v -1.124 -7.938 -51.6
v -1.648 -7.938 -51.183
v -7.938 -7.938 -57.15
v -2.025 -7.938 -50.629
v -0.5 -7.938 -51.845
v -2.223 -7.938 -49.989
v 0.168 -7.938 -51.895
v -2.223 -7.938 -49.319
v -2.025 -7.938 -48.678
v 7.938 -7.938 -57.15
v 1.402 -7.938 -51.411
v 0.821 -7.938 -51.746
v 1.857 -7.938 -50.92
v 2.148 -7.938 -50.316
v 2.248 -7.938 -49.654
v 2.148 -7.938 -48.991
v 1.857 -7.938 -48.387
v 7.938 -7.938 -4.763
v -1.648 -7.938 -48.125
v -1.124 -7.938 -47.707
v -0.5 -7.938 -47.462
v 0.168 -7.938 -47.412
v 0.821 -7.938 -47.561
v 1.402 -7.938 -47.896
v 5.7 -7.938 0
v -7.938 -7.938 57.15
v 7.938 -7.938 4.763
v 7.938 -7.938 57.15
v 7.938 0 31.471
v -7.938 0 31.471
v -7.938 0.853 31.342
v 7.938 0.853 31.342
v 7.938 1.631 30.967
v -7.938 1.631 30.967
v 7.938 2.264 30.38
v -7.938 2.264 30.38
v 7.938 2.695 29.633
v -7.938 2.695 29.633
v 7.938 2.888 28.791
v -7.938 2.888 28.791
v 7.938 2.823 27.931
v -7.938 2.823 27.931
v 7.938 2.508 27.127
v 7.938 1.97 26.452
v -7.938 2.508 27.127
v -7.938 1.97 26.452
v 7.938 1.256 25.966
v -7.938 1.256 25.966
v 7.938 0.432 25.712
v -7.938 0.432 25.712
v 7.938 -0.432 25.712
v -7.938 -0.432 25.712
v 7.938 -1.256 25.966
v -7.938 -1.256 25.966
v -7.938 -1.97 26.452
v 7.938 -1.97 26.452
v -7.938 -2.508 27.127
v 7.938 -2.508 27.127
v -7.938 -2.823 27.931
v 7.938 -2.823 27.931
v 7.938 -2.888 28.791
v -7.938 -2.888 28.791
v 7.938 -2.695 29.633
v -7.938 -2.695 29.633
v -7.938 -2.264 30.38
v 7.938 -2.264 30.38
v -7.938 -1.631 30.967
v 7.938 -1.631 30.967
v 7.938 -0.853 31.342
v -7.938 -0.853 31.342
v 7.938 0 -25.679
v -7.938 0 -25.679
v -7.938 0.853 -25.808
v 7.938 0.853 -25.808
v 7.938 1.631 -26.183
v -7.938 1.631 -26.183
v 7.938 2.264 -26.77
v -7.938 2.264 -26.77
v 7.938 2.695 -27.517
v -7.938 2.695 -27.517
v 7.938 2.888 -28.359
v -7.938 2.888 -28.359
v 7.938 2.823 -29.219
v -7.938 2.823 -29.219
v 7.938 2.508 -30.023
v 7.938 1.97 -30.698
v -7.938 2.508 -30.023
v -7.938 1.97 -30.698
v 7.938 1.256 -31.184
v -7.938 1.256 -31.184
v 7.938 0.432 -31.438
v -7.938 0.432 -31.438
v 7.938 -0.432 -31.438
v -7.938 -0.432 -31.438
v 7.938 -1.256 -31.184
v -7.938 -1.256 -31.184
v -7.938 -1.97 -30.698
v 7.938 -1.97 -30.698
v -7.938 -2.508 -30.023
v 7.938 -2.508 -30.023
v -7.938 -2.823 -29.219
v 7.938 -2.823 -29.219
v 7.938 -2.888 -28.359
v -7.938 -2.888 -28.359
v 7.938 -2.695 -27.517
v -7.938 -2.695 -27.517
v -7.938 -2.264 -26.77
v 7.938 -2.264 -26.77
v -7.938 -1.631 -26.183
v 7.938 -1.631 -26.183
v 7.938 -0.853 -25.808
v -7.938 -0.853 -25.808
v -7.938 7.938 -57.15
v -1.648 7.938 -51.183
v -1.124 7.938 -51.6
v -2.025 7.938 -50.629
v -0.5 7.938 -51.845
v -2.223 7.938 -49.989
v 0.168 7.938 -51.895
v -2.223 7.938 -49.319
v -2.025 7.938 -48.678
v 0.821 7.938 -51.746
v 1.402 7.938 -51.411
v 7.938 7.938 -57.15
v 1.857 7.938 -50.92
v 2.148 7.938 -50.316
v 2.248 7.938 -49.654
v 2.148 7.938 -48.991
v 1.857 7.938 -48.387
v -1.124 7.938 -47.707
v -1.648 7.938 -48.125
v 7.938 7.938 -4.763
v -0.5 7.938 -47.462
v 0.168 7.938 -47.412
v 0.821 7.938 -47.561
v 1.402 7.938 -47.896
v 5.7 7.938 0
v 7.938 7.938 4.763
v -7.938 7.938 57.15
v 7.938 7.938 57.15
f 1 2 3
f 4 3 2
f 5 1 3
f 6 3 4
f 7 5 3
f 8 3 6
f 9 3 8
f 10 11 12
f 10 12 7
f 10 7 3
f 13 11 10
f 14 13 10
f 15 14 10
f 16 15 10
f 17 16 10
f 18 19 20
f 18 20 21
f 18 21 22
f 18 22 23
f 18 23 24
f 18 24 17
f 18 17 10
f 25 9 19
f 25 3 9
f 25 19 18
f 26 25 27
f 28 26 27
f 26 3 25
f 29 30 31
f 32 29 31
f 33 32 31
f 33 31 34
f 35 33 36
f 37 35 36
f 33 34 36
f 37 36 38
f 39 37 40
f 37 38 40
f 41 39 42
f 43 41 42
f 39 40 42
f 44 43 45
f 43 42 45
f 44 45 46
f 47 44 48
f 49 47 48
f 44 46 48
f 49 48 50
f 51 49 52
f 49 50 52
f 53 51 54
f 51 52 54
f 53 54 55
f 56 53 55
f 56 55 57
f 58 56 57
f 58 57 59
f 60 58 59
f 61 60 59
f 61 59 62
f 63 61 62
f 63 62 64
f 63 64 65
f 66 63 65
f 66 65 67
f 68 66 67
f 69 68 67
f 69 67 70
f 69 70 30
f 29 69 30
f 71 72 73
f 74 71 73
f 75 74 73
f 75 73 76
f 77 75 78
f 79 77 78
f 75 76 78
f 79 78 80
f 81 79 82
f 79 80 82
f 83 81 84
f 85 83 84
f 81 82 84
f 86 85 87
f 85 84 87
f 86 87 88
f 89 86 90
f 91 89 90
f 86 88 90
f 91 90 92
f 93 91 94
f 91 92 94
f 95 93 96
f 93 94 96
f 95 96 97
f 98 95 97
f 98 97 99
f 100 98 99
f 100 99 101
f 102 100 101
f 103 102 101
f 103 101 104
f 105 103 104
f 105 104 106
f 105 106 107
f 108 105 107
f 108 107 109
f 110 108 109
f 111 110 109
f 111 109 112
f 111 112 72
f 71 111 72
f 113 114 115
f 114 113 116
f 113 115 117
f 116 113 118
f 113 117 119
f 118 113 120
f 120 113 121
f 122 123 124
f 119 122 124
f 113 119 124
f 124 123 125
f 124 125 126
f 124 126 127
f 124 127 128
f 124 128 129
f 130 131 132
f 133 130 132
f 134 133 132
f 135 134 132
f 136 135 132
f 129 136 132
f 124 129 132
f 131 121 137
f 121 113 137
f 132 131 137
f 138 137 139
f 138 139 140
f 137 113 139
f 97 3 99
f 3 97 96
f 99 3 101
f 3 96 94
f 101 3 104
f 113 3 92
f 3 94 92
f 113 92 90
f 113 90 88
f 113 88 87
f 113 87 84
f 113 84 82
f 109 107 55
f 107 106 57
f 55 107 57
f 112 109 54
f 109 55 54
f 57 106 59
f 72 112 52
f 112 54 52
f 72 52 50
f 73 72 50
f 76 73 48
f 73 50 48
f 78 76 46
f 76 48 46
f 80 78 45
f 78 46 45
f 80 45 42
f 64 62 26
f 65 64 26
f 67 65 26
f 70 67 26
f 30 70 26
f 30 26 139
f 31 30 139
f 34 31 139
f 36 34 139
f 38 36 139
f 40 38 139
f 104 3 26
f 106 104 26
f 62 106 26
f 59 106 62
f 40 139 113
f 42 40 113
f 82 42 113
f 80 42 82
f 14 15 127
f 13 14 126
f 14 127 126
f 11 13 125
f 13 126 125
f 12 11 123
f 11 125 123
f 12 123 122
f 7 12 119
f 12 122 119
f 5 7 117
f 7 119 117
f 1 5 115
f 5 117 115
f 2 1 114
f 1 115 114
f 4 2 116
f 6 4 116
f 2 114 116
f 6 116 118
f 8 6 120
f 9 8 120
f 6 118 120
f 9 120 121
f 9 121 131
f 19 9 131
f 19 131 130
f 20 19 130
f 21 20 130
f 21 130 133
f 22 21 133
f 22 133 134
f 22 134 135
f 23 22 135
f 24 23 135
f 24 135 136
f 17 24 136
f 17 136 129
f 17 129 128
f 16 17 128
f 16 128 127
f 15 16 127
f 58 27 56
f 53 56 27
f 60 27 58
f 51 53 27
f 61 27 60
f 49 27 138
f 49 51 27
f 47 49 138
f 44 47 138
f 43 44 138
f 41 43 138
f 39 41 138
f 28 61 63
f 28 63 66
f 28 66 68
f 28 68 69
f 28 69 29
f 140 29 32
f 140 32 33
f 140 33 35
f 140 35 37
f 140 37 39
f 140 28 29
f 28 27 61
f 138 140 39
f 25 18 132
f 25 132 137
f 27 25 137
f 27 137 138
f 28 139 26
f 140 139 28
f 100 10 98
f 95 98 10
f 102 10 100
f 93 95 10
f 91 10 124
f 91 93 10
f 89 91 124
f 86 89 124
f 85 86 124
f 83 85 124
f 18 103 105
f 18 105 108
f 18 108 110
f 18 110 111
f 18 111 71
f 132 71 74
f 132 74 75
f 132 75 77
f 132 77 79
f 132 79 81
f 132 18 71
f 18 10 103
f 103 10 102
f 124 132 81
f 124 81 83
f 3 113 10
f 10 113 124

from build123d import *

# Parameters (mm, degrees)
SKETCH1_W                  = 15.875
SKETCH1_H                  = 15.875
BOSS_EXTRUDE1_DEPTH        = 57.15
CUT_EXTRUDE1_DEPTH         = 60.842643919
CUT_EXTRUDE1_DEPTH_BACK    = 60.842643919
F_12_CLEARANCE_HOLE1_D     = 5.7912
F_12_CLEARANCE_HOLE1_DEPTH = 42.07002
F_12_CLEARANCE_HOLE1_TIP   = 1.739852008
F_12_24_TAPPED_HOLE1_D     = 4.4958


with BuildPart() as part:
    # Sketch1 → Boss-Extrude1 (new, symmetric)
    with BuildSketch(Plane.XY):
        Rectangle(SKETCH1_W, SKETCH1_H)
    extrude(amount=BOSS_EXTRUDE1_DEPTH, both=True)

    # Sketch2 → Cut-Extrude1 (cut, two sides: drawn at the far end of the back side and taken through both)
    with BuildSketch(Plane(origin=(0, 7.9375, 0), x_dir=(1, 0, 0), z_dir=(0, 1, 0)).offset(-CUT_EXTRUDE1_DEPTH_BACK)):
        Polygon((66.547875099, 129.510772403), (7.9375, 4.7625), (5.699938661, 0), (7.9375, -4.7625), (66.547875099, -129.510772403), (342.209316267, -129.510772403), (342.209316267, 129.510772403), align=None)
    extrude(amount=CUT_EXTRUDE1_DEPTH + CUT_EXTRUDE1_DEPTH_BACK, mode=Mode.SUBTRACT)

    # #12 Clearance Hole1
    with Locations(Plane(origin=(7.9375, 0, 0), x_dir=(0, 0, -1), z_dir=(1, 0, 0))):
        with Locations((28.575, 0), (-28.575, 0)):
            Hole(F_12_CLEARANCE_HOLE1_D / 2, depth=F_12_CLEARANCE_HOLE1_DEPTH)
            with Locations((0, 0, -(F_12_CLEARANCE_HOLE1_DEPTH + F_12_CLEARANCE_HOLE1_TIP / 2))):  # 118° drill point
                Cone(0, F_12_CLEARANCE_HOLE1_D / 2, F_12_CLEARANCE_HOLE1_TIP, mode=Mode.SUBTRACT)

    # #12-24 Tapped Hole1 (through all)
    with Locations(Plane(origin=(0, -7.9375, 0), x_dir=(-1, 0, 0), z_dir=(0, -1, 0))):
        with Locations((0, 49.653581933)):
            Hole(F_12_24_TAPPED_HOLE1_D / 2)


solid = part.part
